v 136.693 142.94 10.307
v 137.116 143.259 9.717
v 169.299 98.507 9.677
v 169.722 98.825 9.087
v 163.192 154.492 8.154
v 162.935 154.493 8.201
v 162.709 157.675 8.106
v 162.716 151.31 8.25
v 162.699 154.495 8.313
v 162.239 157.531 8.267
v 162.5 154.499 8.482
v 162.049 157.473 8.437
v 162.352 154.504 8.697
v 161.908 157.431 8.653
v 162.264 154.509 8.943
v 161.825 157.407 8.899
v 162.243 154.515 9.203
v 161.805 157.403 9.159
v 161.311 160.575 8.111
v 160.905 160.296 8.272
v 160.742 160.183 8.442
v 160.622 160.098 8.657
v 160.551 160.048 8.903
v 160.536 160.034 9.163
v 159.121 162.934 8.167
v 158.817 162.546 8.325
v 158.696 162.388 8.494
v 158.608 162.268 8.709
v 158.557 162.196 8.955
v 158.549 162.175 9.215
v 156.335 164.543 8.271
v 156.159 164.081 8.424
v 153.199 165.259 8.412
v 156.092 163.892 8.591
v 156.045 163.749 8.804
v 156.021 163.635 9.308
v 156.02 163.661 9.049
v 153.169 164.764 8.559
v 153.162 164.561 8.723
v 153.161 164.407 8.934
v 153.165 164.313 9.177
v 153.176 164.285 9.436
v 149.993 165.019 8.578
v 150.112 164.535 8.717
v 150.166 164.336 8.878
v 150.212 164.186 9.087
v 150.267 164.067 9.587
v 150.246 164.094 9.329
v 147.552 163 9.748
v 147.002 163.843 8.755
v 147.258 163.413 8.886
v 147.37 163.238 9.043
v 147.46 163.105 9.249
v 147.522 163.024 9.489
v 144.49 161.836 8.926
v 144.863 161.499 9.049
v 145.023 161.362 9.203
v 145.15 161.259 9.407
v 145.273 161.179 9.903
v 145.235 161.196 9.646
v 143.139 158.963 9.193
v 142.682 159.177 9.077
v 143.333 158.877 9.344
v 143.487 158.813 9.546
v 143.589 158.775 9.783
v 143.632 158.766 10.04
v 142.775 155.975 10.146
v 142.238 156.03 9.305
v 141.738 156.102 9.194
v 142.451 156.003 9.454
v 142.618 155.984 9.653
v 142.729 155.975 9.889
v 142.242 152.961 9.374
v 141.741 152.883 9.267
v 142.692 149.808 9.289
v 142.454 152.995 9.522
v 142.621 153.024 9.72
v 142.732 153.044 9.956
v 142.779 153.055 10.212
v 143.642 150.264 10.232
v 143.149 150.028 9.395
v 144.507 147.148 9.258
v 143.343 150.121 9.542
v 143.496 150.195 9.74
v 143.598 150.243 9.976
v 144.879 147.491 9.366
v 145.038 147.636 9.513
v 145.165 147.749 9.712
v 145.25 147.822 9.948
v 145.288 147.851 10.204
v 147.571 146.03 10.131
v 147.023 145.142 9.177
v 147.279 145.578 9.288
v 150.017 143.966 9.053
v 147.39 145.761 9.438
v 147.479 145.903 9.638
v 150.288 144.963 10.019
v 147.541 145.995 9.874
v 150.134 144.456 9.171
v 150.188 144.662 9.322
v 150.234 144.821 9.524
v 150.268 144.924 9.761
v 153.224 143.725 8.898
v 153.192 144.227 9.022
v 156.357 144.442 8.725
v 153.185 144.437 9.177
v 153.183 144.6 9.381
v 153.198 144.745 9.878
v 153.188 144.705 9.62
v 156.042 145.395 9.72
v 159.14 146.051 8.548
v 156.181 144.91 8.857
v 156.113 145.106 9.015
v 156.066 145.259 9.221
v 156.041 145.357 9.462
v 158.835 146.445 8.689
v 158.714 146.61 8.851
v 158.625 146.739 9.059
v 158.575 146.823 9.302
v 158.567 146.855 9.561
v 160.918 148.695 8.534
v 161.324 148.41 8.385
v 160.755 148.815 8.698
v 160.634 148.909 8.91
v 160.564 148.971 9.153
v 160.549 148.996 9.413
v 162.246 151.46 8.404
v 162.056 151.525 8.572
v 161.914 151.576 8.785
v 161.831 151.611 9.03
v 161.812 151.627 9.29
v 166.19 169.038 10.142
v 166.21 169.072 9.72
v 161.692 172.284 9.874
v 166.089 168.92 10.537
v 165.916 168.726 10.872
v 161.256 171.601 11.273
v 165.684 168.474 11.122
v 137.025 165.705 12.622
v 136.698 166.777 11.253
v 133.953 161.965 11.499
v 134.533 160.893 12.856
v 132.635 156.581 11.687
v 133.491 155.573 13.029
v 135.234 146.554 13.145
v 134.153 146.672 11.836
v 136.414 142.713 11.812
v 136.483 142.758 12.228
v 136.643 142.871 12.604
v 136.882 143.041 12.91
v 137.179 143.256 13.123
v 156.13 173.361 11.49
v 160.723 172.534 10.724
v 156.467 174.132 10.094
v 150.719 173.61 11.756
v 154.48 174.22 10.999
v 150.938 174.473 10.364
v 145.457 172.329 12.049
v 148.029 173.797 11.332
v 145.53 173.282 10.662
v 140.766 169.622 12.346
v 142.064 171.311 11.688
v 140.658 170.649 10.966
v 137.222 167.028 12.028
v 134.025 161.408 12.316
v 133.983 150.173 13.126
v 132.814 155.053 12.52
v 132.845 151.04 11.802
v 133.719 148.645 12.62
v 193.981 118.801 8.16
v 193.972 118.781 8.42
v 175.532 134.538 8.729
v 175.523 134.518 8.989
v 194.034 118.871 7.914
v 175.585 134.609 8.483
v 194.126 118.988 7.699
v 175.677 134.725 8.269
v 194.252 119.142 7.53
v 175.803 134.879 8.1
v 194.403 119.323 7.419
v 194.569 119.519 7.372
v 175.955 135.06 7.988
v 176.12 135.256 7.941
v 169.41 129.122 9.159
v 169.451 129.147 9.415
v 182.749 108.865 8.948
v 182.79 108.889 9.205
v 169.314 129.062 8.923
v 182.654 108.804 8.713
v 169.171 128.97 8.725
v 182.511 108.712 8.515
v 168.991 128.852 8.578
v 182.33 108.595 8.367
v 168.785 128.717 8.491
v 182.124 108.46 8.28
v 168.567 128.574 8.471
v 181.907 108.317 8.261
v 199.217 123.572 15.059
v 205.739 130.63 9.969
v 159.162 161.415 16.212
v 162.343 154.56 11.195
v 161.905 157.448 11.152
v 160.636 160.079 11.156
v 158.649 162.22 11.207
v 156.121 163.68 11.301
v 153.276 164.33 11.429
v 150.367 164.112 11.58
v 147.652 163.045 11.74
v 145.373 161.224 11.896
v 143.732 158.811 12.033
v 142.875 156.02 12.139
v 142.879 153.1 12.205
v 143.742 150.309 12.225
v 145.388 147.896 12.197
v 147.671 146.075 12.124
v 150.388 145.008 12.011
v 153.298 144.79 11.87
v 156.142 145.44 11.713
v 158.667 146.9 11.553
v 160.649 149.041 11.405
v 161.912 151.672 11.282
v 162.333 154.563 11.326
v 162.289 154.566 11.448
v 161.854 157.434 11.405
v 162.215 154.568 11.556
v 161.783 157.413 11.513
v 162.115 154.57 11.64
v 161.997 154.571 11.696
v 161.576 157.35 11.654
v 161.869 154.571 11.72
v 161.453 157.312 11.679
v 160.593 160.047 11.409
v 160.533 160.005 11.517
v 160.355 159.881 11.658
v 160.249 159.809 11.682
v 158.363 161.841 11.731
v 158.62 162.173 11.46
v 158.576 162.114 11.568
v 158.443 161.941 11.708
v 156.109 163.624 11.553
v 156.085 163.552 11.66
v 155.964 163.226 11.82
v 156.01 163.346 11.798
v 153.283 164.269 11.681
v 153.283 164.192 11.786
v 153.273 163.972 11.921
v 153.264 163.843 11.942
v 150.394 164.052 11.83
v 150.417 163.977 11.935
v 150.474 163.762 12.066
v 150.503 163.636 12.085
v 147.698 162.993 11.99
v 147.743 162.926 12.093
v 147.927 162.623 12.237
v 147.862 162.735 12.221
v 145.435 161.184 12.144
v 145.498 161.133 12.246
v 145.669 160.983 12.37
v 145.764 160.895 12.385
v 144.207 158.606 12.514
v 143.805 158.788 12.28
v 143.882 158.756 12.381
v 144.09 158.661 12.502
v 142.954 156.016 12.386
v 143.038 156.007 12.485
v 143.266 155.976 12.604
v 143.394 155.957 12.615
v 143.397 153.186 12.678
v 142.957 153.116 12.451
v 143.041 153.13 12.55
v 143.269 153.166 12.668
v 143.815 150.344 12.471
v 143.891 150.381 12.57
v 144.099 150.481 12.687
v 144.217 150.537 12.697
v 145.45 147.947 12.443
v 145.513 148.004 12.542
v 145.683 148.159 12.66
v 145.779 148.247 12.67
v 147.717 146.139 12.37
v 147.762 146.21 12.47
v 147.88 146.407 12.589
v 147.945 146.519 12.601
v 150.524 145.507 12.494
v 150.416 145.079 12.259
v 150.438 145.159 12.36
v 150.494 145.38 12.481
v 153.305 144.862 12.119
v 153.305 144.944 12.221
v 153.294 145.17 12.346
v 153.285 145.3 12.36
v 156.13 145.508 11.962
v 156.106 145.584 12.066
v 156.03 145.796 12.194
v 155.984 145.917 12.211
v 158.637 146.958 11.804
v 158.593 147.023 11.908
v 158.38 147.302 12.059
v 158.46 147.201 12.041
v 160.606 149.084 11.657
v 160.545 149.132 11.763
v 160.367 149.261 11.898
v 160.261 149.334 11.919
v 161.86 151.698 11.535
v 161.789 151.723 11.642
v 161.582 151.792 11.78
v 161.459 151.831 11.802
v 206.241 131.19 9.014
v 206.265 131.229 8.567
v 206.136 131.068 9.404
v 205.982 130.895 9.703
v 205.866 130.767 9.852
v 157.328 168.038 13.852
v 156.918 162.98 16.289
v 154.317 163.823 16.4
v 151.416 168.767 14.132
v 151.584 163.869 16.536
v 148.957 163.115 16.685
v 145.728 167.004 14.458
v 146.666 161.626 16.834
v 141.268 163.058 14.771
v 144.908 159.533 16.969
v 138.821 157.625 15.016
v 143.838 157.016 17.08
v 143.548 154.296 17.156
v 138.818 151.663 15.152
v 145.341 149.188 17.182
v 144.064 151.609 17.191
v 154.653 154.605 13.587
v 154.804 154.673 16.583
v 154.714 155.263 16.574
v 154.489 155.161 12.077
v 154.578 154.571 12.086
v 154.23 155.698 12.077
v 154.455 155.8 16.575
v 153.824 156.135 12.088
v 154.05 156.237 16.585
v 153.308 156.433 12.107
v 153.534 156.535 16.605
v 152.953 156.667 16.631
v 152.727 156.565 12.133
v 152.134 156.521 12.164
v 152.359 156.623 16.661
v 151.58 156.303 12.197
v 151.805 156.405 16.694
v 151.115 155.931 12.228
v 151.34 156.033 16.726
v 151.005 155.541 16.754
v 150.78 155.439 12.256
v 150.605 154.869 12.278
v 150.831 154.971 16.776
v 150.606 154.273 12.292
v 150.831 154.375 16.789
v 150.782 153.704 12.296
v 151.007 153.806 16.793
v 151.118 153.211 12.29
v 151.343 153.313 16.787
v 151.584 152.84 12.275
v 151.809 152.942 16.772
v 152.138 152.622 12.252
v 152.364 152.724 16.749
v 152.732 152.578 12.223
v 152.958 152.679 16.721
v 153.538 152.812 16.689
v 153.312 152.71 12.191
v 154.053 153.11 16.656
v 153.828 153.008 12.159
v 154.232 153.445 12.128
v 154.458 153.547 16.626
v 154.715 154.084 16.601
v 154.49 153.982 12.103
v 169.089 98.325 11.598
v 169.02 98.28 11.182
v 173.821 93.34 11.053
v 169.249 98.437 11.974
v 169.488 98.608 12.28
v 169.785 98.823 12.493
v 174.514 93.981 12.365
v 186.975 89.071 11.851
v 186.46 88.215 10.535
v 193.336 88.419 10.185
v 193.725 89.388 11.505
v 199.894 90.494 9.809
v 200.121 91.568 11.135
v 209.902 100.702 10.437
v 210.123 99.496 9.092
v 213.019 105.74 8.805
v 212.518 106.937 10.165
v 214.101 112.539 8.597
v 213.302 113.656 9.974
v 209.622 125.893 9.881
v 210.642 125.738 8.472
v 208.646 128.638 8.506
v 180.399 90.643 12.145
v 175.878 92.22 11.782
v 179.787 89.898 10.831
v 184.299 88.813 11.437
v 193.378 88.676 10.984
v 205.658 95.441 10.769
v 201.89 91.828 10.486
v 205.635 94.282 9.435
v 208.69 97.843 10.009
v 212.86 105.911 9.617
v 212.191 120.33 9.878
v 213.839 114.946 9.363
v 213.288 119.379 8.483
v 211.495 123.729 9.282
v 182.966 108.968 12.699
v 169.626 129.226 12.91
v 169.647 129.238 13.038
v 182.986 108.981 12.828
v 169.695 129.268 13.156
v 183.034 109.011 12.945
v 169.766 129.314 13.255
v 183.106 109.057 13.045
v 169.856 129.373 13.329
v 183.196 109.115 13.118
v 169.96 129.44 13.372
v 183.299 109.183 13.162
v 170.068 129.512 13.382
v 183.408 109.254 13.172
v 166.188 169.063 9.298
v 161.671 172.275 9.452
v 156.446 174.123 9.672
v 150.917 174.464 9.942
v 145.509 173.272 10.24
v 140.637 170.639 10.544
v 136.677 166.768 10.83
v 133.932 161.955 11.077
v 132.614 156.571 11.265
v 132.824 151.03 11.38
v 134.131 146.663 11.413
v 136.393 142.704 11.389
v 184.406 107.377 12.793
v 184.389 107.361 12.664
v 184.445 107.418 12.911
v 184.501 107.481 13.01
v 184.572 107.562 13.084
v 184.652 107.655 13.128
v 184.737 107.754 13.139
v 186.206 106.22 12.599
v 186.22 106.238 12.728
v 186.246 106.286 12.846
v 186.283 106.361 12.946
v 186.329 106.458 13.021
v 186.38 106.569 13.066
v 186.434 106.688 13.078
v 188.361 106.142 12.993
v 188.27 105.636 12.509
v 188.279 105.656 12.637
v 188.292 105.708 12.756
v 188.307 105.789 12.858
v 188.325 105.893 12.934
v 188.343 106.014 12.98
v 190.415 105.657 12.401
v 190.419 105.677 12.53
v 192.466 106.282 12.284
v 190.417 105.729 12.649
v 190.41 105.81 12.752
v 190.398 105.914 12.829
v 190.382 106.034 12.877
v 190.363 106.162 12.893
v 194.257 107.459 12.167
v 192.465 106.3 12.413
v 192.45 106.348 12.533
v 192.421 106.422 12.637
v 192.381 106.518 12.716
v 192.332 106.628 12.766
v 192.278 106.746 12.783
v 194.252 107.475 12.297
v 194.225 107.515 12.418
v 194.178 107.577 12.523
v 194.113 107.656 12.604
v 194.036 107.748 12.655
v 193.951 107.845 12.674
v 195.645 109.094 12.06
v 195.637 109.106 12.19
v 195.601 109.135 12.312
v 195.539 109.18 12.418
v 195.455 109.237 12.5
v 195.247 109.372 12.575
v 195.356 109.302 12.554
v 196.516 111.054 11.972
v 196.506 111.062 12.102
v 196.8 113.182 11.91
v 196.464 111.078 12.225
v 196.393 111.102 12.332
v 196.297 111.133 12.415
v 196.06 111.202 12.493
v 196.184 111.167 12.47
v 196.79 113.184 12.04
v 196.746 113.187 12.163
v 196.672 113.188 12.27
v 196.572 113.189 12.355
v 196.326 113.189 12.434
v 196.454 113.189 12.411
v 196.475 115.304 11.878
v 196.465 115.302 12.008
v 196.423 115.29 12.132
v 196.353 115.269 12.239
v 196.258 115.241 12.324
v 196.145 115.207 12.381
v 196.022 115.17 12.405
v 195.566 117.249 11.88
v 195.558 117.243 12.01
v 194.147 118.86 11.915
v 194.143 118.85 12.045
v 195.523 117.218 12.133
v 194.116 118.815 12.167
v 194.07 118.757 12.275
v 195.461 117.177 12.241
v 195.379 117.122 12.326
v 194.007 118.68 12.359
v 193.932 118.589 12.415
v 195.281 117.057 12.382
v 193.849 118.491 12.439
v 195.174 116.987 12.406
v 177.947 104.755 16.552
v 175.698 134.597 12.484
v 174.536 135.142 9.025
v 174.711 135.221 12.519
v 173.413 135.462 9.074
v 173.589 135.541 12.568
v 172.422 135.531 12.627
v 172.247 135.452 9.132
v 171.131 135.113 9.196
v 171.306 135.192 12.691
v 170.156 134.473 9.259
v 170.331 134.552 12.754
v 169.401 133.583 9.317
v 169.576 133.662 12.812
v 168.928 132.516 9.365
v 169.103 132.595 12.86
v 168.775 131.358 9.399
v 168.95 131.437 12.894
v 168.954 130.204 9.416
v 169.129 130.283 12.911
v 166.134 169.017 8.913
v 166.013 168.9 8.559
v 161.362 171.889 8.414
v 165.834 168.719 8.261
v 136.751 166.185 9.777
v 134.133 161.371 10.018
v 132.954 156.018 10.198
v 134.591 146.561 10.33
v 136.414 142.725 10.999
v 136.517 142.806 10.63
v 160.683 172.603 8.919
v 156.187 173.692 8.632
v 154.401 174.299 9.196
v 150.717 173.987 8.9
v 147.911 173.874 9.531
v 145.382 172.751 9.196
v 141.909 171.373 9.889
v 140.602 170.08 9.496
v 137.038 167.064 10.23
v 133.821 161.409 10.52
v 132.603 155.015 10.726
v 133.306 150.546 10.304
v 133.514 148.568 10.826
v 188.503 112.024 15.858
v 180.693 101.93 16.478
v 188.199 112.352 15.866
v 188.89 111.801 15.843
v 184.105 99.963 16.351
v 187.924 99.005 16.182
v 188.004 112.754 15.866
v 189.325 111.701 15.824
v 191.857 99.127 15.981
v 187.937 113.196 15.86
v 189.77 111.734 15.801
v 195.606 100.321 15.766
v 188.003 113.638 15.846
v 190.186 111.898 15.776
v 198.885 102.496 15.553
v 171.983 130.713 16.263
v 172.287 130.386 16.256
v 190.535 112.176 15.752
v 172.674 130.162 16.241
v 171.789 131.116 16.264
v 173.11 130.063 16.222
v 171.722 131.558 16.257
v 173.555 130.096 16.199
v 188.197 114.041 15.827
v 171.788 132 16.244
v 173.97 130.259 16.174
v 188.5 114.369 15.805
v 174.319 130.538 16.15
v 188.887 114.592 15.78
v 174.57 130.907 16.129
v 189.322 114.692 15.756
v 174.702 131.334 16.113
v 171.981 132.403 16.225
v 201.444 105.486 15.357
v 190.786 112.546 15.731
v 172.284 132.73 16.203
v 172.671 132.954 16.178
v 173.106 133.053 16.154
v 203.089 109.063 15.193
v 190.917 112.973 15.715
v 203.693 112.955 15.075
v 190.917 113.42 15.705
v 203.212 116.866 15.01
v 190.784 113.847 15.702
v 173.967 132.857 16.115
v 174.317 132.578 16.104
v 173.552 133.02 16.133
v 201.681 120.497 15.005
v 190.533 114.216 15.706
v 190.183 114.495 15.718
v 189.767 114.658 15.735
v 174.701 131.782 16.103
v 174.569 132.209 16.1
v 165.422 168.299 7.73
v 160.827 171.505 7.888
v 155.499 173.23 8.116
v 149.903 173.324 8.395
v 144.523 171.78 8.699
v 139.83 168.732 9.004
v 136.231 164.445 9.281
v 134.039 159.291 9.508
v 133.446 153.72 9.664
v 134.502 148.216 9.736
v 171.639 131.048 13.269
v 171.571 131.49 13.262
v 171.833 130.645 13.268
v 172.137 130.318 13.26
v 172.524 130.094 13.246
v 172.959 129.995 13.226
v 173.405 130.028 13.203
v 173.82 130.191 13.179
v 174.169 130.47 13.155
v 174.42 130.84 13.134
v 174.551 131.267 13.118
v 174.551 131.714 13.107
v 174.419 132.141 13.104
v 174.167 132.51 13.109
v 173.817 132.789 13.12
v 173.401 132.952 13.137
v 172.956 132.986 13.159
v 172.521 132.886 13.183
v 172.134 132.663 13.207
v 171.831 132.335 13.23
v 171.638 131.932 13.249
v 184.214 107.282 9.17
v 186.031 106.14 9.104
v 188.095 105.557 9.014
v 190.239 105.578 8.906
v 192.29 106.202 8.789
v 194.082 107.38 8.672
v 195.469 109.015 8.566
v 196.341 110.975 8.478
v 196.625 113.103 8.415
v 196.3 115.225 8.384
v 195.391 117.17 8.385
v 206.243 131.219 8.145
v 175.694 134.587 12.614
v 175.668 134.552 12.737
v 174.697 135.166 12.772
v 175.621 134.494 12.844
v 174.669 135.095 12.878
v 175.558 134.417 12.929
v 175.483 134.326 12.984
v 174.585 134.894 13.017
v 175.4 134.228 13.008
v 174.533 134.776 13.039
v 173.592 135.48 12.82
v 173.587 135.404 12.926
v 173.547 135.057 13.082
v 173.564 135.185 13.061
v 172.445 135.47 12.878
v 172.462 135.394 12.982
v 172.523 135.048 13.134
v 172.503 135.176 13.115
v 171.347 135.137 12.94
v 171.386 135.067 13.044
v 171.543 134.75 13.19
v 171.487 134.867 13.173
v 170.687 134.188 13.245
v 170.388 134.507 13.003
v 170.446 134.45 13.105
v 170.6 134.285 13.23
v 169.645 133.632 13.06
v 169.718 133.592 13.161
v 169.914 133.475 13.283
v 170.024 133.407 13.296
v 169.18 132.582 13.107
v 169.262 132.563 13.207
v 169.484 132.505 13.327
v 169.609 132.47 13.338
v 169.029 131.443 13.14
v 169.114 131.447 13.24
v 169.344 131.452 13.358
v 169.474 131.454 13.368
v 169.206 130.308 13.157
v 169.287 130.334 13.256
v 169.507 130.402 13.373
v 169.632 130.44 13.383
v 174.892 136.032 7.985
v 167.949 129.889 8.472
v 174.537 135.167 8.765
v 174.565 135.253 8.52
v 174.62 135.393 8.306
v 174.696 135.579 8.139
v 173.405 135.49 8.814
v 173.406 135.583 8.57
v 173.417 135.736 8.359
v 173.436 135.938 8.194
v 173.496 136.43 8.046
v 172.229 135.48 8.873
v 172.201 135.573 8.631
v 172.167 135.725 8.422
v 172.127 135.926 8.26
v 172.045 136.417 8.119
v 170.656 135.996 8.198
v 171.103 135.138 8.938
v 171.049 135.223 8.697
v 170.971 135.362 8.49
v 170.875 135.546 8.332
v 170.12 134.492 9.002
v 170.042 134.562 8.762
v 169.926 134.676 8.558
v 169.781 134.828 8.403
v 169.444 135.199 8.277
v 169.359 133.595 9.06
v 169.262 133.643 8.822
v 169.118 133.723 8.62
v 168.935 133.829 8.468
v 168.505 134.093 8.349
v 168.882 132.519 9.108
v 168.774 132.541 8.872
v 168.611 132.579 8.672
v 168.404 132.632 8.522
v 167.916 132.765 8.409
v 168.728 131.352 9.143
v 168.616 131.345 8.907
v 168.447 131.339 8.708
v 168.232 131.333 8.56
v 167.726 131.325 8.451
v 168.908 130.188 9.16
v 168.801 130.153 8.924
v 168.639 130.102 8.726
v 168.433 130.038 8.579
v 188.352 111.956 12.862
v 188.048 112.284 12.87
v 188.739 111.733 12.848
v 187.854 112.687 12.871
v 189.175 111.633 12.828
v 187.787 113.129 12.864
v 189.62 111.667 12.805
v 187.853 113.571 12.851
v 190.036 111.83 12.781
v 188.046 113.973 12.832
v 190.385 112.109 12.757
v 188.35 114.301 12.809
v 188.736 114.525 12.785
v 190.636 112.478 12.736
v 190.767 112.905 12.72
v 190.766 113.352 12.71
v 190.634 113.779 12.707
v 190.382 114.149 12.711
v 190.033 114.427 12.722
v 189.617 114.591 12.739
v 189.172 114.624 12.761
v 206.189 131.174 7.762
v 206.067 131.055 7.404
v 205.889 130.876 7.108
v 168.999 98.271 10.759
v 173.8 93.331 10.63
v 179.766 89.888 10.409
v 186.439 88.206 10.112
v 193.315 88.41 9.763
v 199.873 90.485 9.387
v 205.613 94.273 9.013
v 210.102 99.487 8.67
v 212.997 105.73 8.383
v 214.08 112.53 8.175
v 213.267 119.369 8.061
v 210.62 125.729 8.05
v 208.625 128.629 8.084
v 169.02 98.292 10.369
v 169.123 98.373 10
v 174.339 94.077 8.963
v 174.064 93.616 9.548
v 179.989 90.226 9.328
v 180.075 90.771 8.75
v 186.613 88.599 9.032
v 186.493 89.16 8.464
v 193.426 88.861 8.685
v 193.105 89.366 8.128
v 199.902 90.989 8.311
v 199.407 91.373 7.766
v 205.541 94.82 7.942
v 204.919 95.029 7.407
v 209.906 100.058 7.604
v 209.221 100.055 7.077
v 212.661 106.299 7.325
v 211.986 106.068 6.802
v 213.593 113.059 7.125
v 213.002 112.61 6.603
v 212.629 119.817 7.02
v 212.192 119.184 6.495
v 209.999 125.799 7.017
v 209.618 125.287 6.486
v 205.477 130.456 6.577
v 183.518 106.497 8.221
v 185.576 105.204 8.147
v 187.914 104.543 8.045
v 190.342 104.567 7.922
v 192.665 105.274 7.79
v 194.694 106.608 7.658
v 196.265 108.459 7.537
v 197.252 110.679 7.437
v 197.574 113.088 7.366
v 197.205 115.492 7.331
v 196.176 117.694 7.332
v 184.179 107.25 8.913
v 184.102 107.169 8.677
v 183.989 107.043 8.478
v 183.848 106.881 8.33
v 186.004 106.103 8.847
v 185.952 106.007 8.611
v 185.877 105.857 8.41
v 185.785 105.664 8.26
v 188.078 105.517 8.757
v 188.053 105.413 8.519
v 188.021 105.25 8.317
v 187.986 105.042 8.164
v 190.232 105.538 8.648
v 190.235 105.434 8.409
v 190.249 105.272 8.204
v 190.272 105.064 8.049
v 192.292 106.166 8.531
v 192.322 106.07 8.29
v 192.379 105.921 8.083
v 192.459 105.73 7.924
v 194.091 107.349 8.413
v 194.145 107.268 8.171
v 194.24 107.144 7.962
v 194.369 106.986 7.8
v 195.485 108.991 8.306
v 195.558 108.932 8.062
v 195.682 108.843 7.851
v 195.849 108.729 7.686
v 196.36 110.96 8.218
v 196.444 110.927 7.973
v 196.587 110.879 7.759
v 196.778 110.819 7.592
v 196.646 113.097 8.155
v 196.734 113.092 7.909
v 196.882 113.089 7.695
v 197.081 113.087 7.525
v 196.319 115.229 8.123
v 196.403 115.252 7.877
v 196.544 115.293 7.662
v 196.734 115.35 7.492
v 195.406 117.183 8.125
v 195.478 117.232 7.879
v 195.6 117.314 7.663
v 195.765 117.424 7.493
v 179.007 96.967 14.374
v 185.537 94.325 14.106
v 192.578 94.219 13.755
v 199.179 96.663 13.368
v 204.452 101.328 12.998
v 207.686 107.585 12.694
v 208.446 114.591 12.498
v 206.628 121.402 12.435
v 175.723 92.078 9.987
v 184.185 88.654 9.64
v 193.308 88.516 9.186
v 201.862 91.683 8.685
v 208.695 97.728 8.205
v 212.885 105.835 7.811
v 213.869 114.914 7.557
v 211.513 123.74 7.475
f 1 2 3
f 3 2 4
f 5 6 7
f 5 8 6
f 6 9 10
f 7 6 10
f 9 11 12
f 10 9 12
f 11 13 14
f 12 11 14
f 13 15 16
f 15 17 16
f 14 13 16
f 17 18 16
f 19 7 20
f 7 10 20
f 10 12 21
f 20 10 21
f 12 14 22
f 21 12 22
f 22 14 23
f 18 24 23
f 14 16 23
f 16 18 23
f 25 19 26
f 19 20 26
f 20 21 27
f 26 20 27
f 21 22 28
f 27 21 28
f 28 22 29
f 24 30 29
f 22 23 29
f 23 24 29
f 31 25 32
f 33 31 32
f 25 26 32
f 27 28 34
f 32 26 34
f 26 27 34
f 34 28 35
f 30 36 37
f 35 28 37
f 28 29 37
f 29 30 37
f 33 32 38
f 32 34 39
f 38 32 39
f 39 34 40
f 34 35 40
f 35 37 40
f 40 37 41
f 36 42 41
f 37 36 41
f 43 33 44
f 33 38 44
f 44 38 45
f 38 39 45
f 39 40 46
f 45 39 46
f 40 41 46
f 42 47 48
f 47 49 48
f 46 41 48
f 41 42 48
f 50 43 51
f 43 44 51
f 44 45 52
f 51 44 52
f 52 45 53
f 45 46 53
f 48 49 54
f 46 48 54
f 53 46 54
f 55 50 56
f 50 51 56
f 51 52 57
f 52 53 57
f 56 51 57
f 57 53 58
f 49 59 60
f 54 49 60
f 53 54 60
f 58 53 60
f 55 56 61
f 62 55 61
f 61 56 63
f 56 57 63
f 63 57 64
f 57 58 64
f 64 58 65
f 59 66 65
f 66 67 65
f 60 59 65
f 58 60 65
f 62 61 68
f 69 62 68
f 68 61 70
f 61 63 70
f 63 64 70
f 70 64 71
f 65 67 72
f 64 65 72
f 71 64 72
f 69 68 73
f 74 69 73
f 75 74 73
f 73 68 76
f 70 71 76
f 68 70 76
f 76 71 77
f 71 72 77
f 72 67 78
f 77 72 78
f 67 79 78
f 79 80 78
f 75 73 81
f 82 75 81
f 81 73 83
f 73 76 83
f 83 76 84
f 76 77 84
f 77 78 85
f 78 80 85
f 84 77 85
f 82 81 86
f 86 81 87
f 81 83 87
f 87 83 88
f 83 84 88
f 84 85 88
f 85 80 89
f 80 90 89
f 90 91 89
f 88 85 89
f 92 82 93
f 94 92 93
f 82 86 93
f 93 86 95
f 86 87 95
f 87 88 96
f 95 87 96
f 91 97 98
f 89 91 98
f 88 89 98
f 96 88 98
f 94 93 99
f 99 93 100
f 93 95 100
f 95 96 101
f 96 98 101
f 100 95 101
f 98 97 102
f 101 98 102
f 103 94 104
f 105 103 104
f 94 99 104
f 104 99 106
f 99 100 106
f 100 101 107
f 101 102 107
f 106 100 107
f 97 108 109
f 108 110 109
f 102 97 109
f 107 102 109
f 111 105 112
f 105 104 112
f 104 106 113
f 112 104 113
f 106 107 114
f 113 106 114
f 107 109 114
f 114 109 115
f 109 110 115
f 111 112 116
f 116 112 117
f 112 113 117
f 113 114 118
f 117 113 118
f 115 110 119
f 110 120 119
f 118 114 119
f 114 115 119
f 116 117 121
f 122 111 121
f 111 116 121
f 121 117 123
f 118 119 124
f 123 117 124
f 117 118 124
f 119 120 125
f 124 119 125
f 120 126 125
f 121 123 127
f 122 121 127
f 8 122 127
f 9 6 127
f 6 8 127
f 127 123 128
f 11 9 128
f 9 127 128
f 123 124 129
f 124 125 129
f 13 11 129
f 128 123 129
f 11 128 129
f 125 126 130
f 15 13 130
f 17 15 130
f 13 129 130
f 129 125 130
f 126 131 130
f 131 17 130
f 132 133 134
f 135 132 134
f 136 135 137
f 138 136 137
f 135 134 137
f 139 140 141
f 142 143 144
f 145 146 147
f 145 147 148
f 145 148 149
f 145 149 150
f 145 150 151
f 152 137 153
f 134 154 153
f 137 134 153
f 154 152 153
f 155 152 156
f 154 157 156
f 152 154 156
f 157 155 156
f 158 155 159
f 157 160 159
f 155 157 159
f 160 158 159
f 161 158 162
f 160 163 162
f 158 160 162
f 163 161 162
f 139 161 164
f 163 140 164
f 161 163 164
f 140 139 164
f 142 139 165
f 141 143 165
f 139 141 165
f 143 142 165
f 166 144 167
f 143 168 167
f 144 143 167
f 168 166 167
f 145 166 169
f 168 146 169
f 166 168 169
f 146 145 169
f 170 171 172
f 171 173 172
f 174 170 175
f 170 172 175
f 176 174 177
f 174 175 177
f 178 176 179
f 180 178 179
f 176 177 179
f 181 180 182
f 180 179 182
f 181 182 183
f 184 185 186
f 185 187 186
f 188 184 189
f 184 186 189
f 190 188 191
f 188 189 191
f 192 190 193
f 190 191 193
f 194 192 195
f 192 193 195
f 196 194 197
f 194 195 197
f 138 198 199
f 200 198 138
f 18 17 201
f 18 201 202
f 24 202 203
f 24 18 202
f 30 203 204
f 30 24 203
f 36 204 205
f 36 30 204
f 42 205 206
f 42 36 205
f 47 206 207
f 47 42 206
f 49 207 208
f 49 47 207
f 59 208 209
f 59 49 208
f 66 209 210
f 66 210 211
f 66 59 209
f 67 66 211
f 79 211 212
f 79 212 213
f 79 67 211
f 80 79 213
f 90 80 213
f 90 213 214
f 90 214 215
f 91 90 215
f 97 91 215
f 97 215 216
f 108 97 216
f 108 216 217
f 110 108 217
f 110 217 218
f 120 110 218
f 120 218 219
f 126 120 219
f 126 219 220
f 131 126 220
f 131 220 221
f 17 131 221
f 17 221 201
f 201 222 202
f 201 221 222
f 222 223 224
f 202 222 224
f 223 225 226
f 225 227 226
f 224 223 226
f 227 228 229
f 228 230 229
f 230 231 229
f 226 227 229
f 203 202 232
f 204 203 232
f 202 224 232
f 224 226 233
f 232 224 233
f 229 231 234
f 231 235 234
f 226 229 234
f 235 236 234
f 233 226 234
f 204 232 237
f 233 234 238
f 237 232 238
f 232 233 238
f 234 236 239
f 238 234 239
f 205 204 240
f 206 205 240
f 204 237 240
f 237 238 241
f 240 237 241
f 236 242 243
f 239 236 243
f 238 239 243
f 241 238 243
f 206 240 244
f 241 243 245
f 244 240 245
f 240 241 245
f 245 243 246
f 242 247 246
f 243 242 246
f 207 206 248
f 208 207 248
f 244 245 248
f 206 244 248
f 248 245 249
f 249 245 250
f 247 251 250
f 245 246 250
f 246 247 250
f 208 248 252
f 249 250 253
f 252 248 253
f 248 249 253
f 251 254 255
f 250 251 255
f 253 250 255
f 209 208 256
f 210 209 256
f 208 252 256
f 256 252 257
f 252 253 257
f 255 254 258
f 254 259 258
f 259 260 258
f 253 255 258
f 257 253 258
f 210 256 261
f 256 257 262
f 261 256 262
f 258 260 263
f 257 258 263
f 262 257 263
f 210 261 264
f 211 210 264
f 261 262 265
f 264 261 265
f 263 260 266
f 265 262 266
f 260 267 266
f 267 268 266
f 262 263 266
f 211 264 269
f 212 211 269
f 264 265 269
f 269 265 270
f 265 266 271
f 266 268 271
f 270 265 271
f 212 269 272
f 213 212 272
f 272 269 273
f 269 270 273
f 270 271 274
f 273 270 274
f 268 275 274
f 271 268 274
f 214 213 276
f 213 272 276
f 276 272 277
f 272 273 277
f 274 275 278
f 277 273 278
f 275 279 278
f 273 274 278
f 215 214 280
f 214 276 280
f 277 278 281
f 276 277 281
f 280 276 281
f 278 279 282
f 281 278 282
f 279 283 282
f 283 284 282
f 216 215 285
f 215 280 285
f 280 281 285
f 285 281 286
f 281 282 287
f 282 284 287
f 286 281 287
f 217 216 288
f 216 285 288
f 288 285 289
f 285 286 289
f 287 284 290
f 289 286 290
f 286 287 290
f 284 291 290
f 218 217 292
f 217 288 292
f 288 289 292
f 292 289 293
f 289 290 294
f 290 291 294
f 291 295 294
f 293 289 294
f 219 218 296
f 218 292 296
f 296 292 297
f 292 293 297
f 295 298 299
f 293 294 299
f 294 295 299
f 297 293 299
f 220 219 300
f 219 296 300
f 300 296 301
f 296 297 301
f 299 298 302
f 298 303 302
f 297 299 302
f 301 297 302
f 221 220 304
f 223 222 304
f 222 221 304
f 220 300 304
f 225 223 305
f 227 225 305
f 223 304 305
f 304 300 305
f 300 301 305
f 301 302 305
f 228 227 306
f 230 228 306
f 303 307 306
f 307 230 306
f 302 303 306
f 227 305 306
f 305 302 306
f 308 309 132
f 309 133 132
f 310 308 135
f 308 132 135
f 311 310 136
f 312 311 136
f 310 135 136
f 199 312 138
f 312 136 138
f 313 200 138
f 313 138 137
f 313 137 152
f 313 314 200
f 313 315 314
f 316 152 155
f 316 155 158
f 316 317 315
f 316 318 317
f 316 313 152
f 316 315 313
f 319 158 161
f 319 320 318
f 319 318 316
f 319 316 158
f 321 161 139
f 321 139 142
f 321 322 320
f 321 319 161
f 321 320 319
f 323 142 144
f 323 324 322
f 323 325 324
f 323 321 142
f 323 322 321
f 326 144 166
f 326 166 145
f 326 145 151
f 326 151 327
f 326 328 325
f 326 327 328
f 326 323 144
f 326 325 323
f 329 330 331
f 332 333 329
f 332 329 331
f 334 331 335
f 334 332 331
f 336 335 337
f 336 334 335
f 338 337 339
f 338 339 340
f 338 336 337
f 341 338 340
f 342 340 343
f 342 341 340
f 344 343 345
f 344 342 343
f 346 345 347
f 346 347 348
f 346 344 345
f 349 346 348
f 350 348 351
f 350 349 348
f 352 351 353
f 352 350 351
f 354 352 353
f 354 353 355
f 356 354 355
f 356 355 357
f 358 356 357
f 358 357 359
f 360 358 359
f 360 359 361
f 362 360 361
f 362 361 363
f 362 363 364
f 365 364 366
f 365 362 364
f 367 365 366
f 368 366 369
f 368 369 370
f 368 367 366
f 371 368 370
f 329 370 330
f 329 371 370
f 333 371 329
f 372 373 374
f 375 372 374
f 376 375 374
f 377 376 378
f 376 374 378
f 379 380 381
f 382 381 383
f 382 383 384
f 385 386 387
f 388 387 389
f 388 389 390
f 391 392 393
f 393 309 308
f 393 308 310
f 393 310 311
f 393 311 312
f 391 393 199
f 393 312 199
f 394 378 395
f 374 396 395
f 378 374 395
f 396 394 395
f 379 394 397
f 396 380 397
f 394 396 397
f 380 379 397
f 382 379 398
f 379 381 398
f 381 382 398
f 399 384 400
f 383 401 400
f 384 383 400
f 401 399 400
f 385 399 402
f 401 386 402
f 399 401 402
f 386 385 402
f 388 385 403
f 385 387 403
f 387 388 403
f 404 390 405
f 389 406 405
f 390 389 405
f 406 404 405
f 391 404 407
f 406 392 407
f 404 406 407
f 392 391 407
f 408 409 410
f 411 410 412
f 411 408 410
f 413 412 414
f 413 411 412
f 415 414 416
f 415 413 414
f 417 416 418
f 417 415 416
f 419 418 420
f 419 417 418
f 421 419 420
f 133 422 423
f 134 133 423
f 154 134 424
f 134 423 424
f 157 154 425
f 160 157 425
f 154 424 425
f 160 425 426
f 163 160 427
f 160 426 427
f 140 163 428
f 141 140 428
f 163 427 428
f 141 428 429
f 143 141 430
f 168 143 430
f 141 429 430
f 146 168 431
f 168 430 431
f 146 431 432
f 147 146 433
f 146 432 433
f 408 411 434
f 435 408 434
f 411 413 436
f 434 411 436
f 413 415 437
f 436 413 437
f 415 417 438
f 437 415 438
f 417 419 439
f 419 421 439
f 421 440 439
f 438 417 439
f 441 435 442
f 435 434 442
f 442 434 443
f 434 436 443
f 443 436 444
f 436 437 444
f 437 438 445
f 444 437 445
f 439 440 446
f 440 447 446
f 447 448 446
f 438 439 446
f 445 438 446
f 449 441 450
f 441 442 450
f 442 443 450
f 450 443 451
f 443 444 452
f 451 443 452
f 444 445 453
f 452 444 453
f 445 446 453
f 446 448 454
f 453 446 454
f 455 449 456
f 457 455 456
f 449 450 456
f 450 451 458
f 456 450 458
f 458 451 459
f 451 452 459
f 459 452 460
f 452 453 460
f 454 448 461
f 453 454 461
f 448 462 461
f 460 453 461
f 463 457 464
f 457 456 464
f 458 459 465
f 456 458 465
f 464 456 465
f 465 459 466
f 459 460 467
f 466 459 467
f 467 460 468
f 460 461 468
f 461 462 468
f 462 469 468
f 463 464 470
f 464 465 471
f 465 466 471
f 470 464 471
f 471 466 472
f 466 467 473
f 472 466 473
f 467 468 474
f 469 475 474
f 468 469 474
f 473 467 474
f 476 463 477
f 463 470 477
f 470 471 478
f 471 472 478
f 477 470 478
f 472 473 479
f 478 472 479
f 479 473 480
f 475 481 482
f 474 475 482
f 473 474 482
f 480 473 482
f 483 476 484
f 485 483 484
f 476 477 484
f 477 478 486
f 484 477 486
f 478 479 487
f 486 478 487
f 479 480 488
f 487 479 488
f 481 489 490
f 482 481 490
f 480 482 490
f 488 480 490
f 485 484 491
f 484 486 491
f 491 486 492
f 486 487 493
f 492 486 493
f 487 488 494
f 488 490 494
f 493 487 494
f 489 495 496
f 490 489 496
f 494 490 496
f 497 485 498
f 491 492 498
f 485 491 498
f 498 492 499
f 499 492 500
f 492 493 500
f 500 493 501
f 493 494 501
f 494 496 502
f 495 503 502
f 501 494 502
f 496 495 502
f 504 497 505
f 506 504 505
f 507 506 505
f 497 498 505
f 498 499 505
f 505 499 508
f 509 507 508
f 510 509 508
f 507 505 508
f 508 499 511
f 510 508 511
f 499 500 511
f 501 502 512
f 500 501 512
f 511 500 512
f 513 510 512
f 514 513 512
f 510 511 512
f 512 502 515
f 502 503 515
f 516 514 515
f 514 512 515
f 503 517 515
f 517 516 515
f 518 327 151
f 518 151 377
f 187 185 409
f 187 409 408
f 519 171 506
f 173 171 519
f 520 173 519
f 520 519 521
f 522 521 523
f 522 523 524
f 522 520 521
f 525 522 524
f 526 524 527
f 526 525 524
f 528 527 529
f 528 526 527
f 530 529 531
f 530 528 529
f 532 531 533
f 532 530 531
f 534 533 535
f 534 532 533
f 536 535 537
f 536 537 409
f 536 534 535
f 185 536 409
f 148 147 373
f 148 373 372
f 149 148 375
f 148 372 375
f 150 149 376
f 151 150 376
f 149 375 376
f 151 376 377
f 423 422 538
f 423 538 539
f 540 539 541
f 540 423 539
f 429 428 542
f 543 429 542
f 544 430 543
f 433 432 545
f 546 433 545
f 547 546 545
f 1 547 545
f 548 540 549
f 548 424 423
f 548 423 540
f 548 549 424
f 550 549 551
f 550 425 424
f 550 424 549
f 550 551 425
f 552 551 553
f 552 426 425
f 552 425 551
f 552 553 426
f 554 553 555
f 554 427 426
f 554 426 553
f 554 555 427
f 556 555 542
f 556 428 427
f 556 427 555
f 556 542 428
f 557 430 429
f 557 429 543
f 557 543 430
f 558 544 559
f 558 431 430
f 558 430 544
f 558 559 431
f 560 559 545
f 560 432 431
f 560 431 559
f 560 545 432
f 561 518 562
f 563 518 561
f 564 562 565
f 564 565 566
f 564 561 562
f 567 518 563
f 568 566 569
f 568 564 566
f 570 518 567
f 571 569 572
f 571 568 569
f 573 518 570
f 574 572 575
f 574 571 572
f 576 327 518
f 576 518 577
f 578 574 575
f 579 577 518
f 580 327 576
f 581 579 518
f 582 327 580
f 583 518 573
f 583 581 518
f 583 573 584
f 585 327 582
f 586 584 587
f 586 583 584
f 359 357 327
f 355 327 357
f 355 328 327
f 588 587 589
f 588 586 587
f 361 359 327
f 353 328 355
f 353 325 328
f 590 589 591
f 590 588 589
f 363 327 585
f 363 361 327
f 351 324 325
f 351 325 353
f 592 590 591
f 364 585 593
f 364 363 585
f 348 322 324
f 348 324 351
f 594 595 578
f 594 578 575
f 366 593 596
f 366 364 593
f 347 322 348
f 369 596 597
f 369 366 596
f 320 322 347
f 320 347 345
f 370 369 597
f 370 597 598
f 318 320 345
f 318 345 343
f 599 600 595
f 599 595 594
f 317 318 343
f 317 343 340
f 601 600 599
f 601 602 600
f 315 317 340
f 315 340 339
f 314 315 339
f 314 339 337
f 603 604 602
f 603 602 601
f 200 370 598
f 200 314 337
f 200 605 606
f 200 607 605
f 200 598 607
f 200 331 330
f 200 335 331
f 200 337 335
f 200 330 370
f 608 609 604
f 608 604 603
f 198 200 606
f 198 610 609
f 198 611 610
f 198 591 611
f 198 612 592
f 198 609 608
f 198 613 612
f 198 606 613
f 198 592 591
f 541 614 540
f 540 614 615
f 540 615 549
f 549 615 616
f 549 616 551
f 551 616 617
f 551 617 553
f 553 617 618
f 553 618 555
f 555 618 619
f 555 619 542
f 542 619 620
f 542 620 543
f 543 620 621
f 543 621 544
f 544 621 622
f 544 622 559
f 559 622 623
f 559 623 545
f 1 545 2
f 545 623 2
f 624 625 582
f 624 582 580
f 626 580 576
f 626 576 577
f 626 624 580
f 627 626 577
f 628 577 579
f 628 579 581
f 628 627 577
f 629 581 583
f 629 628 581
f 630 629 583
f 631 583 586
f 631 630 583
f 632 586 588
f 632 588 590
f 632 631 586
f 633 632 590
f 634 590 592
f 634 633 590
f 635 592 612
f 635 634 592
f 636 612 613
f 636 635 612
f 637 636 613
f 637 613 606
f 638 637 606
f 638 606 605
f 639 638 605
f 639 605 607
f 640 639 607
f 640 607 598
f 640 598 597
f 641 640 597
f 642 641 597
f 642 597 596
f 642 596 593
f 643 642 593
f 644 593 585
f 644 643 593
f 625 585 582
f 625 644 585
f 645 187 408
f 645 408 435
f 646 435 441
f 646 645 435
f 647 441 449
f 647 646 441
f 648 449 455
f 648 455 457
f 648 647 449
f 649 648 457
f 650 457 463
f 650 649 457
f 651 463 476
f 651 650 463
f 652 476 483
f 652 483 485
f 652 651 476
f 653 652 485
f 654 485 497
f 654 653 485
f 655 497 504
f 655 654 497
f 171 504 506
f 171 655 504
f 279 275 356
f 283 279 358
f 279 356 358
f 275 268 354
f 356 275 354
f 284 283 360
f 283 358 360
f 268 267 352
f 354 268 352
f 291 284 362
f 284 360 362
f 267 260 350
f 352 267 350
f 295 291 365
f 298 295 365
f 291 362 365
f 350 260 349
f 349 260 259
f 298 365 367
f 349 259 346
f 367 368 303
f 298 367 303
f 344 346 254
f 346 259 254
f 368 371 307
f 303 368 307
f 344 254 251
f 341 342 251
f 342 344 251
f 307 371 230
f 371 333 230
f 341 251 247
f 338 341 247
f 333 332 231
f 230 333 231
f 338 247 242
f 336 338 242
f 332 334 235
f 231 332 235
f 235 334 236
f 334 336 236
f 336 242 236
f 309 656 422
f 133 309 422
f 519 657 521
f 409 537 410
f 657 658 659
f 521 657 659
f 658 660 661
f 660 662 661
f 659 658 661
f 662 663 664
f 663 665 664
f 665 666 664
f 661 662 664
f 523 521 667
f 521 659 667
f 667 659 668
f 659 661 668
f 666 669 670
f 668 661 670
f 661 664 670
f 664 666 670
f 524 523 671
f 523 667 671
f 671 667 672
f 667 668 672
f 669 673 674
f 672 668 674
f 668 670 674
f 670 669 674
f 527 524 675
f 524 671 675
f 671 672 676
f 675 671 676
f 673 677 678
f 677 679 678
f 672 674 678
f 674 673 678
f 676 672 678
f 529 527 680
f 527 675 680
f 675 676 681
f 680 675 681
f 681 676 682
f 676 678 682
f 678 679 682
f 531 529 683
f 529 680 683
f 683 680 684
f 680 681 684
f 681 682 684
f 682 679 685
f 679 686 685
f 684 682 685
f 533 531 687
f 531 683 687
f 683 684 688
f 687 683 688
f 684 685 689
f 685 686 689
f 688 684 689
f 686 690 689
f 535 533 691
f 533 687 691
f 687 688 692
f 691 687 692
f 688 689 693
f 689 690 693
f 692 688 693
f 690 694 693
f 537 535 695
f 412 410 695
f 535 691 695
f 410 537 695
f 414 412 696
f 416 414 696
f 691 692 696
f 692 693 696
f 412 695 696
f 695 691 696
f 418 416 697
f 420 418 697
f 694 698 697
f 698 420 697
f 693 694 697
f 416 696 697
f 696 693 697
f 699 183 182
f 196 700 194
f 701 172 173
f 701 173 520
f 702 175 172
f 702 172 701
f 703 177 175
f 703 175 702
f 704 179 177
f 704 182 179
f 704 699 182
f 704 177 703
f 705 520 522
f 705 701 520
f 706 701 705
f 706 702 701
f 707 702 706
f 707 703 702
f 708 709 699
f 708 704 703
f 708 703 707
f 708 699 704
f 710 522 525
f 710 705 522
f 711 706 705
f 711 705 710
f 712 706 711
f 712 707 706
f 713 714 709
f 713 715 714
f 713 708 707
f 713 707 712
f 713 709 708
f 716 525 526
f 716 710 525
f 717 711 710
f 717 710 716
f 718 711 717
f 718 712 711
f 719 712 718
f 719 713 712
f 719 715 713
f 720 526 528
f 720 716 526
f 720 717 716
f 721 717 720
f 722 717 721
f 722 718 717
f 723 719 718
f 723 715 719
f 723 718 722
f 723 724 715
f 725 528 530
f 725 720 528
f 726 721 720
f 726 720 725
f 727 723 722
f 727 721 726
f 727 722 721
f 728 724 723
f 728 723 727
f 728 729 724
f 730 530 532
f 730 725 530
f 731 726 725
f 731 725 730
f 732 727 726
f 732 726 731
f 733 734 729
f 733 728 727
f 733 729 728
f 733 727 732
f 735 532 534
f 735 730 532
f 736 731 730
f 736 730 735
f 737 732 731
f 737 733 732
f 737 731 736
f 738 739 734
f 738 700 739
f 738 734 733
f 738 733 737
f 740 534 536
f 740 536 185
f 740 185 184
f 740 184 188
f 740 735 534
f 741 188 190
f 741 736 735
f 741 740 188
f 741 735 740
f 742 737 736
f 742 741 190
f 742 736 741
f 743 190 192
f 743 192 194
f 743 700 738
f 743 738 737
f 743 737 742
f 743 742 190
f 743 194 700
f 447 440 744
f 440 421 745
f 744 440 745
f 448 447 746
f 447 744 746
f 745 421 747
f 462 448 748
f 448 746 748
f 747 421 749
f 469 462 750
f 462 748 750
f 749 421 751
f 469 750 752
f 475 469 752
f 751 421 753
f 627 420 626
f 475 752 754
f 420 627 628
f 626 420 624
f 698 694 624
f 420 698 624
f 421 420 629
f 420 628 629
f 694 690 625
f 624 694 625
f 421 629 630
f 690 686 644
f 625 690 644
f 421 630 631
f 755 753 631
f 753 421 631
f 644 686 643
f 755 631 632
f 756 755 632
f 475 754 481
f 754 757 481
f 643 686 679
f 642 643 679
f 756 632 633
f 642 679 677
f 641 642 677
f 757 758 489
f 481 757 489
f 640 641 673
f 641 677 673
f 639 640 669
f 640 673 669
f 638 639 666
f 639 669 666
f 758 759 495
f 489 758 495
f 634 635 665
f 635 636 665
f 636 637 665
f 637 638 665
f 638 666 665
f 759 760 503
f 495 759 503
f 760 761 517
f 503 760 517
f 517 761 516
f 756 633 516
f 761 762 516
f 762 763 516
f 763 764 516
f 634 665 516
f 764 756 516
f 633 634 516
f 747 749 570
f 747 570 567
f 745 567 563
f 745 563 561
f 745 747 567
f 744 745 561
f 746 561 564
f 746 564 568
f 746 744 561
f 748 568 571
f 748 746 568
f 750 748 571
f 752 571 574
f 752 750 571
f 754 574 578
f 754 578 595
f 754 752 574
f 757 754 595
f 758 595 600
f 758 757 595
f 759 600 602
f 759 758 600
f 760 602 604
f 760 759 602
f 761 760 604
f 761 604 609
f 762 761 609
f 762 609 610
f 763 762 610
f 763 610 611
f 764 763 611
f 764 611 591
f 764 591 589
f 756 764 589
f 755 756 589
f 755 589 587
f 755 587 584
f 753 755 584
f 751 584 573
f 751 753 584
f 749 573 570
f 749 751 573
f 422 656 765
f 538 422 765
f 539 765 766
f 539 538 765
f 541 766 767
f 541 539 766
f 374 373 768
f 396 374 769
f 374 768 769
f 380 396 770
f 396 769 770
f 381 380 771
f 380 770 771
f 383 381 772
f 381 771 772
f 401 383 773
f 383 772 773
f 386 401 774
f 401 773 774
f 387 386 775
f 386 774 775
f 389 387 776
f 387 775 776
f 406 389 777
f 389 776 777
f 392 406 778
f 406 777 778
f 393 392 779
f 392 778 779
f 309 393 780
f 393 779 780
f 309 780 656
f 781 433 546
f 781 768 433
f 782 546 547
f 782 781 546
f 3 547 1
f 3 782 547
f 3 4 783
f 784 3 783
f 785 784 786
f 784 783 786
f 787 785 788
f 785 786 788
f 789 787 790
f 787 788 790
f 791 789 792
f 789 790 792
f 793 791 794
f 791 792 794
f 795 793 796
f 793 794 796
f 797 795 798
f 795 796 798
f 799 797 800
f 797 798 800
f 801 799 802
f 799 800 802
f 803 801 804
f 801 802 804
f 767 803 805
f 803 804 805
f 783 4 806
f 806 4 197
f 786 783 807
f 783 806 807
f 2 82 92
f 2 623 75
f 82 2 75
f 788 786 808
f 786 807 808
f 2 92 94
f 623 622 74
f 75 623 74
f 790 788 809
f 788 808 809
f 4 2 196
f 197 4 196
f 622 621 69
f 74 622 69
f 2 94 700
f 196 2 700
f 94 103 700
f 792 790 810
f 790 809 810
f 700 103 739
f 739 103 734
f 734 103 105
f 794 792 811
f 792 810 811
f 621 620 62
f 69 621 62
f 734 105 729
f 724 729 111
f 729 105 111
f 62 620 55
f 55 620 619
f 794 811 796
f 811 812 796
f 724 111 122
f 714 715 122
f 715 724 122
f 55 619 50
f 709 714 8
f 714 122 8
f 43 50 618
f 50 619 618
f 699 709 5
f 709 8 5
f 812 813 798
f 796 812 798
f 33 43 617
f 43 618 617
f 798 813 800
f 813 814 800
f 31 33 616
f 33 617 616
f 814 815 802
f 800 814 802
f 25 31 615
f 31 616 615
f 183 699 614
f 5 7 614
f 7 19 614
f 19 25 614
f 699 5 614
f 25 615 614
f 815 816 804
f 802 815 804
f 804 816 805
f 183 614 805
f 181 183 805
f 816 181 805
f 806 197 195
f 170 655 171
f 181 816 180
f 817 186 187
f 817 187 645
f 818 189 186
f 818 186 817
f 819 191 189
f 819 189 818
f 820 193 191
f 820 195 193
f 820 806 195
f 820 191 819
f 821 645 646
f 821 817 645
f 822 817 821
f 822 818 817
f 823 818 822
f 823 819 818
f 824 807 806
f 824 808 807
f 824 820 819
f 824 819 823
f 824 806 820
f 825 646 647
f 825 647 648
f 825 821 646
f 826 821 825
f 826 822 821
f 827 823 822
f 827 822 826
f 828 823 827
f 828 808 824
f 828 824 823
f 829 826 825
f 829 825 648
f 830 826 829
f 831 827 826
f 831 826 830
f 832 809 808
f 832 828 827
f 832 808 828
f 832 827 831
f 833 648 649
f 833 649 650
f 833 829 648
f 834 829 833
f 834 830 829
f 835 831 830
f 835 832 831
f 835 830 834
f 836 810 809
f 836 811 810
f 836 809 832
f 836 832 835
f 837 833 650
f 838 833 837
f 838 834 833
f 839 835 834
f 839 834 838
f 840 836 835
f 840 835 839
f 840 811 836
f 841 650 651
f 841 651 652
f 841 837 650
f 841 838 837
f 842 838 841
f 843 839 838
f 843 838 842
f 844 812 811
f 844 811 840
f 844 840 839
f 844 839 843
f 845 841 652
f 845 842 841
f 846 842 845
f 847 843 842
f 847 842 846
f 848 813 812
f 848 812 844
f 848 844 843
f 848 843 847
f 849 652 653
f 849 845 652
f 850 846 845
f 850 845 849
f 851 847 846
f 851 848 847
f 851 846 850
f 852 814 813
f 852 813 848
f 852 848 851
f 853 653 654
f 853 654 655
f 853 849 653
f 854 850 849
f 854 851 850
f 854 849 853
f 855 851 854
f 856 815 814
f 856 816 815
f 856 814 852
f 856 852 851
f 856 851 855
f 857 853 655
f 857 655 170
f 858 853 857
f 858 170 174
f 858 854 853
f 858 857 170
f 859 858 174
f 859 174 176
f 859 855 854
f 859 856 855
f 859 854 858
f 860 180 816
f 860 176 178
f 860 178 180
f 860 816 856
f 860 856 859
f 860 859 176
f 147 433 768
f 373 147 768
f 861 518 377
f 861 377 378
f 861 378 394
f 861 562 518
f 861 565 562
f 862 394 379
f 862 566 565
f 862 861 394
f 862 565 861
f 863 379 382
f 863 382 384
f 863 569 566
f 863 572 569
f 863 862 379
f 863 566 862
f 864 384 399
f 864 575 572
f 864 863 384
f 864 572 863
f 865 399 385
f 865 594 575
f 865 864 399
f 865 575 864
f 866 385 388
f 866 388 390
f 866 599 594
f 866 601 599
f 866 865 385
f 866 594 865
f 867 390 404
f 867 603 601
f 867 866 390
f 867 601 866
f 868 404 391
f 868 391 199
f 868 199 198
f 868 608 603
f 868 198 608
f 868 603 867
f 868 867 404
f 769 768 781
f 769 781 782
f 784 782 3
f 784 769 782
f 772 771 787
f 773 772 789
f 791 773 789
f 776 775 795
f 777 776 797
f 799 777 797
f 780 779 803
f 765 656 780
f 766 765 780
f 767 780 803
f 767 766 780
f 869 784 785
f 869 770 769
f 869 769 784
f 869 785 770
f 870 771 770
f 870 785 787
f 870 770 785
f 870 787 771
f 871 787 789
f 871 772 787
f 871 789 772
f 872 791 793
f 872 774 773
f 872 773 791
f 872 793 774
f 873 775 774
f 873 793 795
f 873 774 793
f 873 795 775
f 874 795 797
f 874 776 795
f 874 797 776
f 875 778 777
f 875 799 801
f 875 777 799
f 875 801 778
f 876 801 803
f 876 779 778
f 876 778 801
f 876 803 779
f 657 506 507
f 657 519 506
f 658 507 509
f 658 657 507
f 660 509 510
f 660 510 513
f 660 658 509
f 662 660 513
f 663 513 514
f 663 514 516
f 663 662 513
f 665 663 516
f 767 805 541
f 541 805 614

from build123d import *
from OCP.BRepFilletAPI import BRepFilletAPI_MakeChamfer
from build123d.topology import SkipClean

# Parameters (mm, degrees)
SKETCH3_R           = 9.8
BOSS_EXTRUDE1_DEPTH = 5
BOSS_EXTRUDE2_START = -0.5
SKETCH4_R           = 9.8
SKETCH4_R_2         = 2
BOSS_EXTRUDE2_DEPTH = 1.504241
SKETCH5_R           = 2
SKETCH5_R_2         = 1.5
BOSS_EXTRUDE3_DEPTH = 3
CHAMFER1_SIZE       = 1
CHAMFER2_SIZE       = 5
CHAMFER2_SIZE2      = 10.722534603
FILLET2_R           = 1.5
FILLET3_R           = 0.5
FILLET4_R           = 1


with BuildPart() as part:
    # Sketch3 → Boss-Extrude1 (new body)
    with BuildSketch(Plane(origin=(0.992302705, 0.447759341, 19.778908295), x_dir=(0.9987445115277264, -0.0011337468343132525, -0.050081087361986604), z_dir=(0.050093918725163146, 0.022604009769024314, 0.998488686991054))):
        with BuildLine():
            Line((135.489377025, 142.409589945), (168.136309989, 98.002128608))
            ThreePointArc((168.136309989, 98.002128608), (204.84613825, 94.087969855), (205.427714644, 131.001299406))
            Line((205.427714644, 131.001299406), (165.322500749, 168.808926584))
            ThreePointArc((165.322500749, 168.808926584), (138.349498653, 169.233891264), (135.489377025, 142.409589945))
        make_face()
        with Locations(Location((151.603369143, 154.256077104, 0), (0, 0, 0.064975524))):
            Circle(SKETCH3_R, mode=Mode.SUBTRACT)
        with BuildLine():
            Line((168.620347594, 128.900459544), (181.976463063, 108.65294909))
            ThreePointArc((181.976463063, 108.65294909), (193.282136247, 107.156112711), (193.17203439, 118.559912204))
            Line((193.17203439, 118.559912204), (174.700061825, 134.280399778))
            ThreePointArc((174.700061825, 134.280399778), (169.325765337, 134.228511806), (168.620347594, 128.900459544))
        make_face(mode=Mode.SUBTRACT)
    extrude(amount=BOSS_EXTRUDE1_DEPTH)

    # Sketch4 → Boss-Extrude2 (add)
    with SkipClean():  # the faces are left unmerged after this step: merging them gives an invalid solid
        with BuildSketch(Plane(origin=(1.192465921, 0.538079512, 23.768628243), x_dir=(0.9987445115277264, -0.0011337468343132332, -0.05008108736198663), z_dir=(0.050093918725163174, 0.022604009769023943, 0.998488686991054)).offset(BOSS_EXTRUDE2_START)):
            with Locations(Location((151.603369143, 154.256077104, 0), (0, 0, 0.064975524))):
                Circle(SKETCH4_R)
            with Locations(Location((151.603369143, 154.256077104, 0), (0, 0, 0.064975524))):
                Circle(SKETCH4_R_2, mode=Mode.SUBTRACT)
        extrude(amount=BOSS_EXTRUDE2_DEPTH)

    # Sketch5 → Boss-Extrude3 (add)
    with BuildSketch(Plane(origin=(1.242772298, 0.56077939, 24.77135173), x_dir=(0.9987445115277264, -0.0011337468343133737, -0.05008108736198685), z_dir=(0.05009391872516338, 0.022604009769026656, 0.9984886869910538))):
        with BuildLine():
            Line((205.427714644, 131.001299406), (165.322500749, 168.808926584))
            ThreePointArc((165.322500749, 168.808926584), (138.349498653, 169.233891264), (135.489377025, 142.409589945))
            Line((135.489377025, 142.409589945), (168.136309989, 98.002128608))
            ThreePointArc((168.136309989, 98.002128608), (204.84613825, 94.087969855), (205.427714644, 131.001299406))
        make_face()
        with Locations(Location((151.603369143, 154.256077104, 0), (0, 0, 0.064975524))):
            Circle(SKETCH5_R, mode=Mode.SUBTRACT)
        with Locations(Location((188.278800137, 112.810237556, 0), (0, 0, 180.064975524))):
            Circle(SKETCH5_R_2, mode=Mode.SUBTRACT)
        with Locations(Location((172.042808787, 131.158059903, 0), (0, 0, 180.064975524))):
            Circle(SKETCH5_R_2, mode=Mode.SUBTRACT)
    extrude(amount=BOSS_EXTRUDE3_DEPTH)

    # Chamfer1
    chamfer1_edges = [part.edges().sort_by_distance(p)[0] for p in [
        (186.13467409, 150.10430628, 7.102405178),
        (205.581258989, 94.279385266, 7.390552074),
        (152.614546937, 120.450711021, 9.45540598),
        (139.168105157, 169.481448694, 9.020041697),
    ]]
    chamfer(chamfer1_edges, length=CHAMFER1_SIZE)

    # Chamfer2: one chamfer whose edges measure the first distance from different faces: ONE call of the kernel's chamfer builder (chamfer() names one face for all edges)
    chamfer2_edges_1 = [part.edges().sort_by_distance(p)[0] for p in [
        (205.982010339, 94.460217345, 15.37846157),
    ]]
    chamfer2_side_1 = [part.faces().sort_by_distance(p)[0] for p in [
        (205.806681624, 94.38110331, 11.883751166),
    ]]
    chamfer2_edges_2 = [part.edges().sort_by_distance(p)[0] for p in [
        (186.53542544, 150.285138359, 15.090314673),
    ]]
    chamfer2_side_2 = [part.faces().sort_by_distance(p)[0] for p in [
        (186.360096725, 150.206024324, 11.595604269),
    ]]
    chamfer2_edges_3 = [part.edges().sort_by_distance(p)[0] for p in [
        (139.568856507, 169.662280772, 17.007951193),
    ]]
    chamfer2_side_3 = [part.faces().sort_by_distance(p)[0] for p in [
        (139.393527791, 169.583166738, 13.513240789),
    ]]
    chamfer2_edges_4 = [part.edges().sort_by_distance(p)[0] for p in [
        (153.015298286, 120.631543099, 17.443315476),
    ]]
    chamfer2_side_4 = [part.faces().sort_by_distance(p)[0] for p in [
        (152.839969571, 120.552429065, 13.948605072),
    ]]
    chamfer2 = BRepFilletAPI_MakeChamfer(part.part.solid().wrapped)
    for e in chamfer2_edges_1:
        chamfer2.Add(CHAMFER2_SIZE, CHAMFER2_SIZE2, e.wrapped, chamfer2_side_1[0].wrapped)  # the first distance lies on this face
    for e in chamfer2_edges_2:
        chamfer2.Add(CHAMFER2_SIZE, CHAMFER2_SIZE2, e.wrapped, chamfer2_side_2[0].wrapped)  # the first distance lies on this face
    for e in chamfer2_edges_3:
        chamfer2.Add(CHAMFER2_SIZE, CHAMFER2_SIZE2, e.wrapped, chamfer2_side_3[0].wrapped)  # the first distance lies on this face
    for e in chamfer2_edges_4:
        chamfer2.Add(CHAMFER2_SIZE, CHAMFER2_SIZE2, e.wrapped, chamfer2_side_4[0].wrapped)  # the first distance lies on this face
    add(Compound.cast(chamfer2.Shape()), mode=Mode.REPLACE)

    # Fillet2
    fillet2_edges = [part.edges().sort_by_distance(p)[0] for p in [
        (152.664640855, 120.473315031, 10.453894667),
        (205.631352908, 94.301989276, 8.389040761),
        (139.218199076, 169.504052703, 10.018530384),
        (186.184768009, 150.12691029, 8.100893865),
        (152.764828693, 120.51852305, 12.450872041),
        (205.731540745, 94.347197296, 10.386018135),
        (139.318386913, 169.549260723, 12.015507758),
        (186.284955847, 150.17211831, 10.097871238),
    ]]
    fillet(fillet2_edges, radius=FILLET2_R)

    # Fillet3
    fillet3_edges = [part.edges().sort_by_distance(p)[0] for p in [
        (170.355951089, 134.562936532, 13.253416622),
        (176.3210925, 119.108315502, 13.304012184),
        (194.282245052, 107.470311467, 12.666369547),
        (184.947890817, 126.740016435, 12.698439798),
        (142.792761903, 154.571462674, 12.676779171),
    ]]
    fillet(fillet3_edges, radius=FILLET3_R)

    # Fillet4
    fillet4_edges = [part.edges().sort_by_distance(p)[0] for p in [
        (170.105481495, 134.449916484, 8.260973187),
        (176.070622906, 118.995295453, 8.311568749),
        (194.031775458, 107.357291418, 7.673926112),
        (184.697421224, 126.626996387, 7.705996363),
        (142.617645646, 154.492444508, 9.186303567),
    ]]
    fillet(fillet4_edges, radius=FILLET4_R)


solid = part.part
